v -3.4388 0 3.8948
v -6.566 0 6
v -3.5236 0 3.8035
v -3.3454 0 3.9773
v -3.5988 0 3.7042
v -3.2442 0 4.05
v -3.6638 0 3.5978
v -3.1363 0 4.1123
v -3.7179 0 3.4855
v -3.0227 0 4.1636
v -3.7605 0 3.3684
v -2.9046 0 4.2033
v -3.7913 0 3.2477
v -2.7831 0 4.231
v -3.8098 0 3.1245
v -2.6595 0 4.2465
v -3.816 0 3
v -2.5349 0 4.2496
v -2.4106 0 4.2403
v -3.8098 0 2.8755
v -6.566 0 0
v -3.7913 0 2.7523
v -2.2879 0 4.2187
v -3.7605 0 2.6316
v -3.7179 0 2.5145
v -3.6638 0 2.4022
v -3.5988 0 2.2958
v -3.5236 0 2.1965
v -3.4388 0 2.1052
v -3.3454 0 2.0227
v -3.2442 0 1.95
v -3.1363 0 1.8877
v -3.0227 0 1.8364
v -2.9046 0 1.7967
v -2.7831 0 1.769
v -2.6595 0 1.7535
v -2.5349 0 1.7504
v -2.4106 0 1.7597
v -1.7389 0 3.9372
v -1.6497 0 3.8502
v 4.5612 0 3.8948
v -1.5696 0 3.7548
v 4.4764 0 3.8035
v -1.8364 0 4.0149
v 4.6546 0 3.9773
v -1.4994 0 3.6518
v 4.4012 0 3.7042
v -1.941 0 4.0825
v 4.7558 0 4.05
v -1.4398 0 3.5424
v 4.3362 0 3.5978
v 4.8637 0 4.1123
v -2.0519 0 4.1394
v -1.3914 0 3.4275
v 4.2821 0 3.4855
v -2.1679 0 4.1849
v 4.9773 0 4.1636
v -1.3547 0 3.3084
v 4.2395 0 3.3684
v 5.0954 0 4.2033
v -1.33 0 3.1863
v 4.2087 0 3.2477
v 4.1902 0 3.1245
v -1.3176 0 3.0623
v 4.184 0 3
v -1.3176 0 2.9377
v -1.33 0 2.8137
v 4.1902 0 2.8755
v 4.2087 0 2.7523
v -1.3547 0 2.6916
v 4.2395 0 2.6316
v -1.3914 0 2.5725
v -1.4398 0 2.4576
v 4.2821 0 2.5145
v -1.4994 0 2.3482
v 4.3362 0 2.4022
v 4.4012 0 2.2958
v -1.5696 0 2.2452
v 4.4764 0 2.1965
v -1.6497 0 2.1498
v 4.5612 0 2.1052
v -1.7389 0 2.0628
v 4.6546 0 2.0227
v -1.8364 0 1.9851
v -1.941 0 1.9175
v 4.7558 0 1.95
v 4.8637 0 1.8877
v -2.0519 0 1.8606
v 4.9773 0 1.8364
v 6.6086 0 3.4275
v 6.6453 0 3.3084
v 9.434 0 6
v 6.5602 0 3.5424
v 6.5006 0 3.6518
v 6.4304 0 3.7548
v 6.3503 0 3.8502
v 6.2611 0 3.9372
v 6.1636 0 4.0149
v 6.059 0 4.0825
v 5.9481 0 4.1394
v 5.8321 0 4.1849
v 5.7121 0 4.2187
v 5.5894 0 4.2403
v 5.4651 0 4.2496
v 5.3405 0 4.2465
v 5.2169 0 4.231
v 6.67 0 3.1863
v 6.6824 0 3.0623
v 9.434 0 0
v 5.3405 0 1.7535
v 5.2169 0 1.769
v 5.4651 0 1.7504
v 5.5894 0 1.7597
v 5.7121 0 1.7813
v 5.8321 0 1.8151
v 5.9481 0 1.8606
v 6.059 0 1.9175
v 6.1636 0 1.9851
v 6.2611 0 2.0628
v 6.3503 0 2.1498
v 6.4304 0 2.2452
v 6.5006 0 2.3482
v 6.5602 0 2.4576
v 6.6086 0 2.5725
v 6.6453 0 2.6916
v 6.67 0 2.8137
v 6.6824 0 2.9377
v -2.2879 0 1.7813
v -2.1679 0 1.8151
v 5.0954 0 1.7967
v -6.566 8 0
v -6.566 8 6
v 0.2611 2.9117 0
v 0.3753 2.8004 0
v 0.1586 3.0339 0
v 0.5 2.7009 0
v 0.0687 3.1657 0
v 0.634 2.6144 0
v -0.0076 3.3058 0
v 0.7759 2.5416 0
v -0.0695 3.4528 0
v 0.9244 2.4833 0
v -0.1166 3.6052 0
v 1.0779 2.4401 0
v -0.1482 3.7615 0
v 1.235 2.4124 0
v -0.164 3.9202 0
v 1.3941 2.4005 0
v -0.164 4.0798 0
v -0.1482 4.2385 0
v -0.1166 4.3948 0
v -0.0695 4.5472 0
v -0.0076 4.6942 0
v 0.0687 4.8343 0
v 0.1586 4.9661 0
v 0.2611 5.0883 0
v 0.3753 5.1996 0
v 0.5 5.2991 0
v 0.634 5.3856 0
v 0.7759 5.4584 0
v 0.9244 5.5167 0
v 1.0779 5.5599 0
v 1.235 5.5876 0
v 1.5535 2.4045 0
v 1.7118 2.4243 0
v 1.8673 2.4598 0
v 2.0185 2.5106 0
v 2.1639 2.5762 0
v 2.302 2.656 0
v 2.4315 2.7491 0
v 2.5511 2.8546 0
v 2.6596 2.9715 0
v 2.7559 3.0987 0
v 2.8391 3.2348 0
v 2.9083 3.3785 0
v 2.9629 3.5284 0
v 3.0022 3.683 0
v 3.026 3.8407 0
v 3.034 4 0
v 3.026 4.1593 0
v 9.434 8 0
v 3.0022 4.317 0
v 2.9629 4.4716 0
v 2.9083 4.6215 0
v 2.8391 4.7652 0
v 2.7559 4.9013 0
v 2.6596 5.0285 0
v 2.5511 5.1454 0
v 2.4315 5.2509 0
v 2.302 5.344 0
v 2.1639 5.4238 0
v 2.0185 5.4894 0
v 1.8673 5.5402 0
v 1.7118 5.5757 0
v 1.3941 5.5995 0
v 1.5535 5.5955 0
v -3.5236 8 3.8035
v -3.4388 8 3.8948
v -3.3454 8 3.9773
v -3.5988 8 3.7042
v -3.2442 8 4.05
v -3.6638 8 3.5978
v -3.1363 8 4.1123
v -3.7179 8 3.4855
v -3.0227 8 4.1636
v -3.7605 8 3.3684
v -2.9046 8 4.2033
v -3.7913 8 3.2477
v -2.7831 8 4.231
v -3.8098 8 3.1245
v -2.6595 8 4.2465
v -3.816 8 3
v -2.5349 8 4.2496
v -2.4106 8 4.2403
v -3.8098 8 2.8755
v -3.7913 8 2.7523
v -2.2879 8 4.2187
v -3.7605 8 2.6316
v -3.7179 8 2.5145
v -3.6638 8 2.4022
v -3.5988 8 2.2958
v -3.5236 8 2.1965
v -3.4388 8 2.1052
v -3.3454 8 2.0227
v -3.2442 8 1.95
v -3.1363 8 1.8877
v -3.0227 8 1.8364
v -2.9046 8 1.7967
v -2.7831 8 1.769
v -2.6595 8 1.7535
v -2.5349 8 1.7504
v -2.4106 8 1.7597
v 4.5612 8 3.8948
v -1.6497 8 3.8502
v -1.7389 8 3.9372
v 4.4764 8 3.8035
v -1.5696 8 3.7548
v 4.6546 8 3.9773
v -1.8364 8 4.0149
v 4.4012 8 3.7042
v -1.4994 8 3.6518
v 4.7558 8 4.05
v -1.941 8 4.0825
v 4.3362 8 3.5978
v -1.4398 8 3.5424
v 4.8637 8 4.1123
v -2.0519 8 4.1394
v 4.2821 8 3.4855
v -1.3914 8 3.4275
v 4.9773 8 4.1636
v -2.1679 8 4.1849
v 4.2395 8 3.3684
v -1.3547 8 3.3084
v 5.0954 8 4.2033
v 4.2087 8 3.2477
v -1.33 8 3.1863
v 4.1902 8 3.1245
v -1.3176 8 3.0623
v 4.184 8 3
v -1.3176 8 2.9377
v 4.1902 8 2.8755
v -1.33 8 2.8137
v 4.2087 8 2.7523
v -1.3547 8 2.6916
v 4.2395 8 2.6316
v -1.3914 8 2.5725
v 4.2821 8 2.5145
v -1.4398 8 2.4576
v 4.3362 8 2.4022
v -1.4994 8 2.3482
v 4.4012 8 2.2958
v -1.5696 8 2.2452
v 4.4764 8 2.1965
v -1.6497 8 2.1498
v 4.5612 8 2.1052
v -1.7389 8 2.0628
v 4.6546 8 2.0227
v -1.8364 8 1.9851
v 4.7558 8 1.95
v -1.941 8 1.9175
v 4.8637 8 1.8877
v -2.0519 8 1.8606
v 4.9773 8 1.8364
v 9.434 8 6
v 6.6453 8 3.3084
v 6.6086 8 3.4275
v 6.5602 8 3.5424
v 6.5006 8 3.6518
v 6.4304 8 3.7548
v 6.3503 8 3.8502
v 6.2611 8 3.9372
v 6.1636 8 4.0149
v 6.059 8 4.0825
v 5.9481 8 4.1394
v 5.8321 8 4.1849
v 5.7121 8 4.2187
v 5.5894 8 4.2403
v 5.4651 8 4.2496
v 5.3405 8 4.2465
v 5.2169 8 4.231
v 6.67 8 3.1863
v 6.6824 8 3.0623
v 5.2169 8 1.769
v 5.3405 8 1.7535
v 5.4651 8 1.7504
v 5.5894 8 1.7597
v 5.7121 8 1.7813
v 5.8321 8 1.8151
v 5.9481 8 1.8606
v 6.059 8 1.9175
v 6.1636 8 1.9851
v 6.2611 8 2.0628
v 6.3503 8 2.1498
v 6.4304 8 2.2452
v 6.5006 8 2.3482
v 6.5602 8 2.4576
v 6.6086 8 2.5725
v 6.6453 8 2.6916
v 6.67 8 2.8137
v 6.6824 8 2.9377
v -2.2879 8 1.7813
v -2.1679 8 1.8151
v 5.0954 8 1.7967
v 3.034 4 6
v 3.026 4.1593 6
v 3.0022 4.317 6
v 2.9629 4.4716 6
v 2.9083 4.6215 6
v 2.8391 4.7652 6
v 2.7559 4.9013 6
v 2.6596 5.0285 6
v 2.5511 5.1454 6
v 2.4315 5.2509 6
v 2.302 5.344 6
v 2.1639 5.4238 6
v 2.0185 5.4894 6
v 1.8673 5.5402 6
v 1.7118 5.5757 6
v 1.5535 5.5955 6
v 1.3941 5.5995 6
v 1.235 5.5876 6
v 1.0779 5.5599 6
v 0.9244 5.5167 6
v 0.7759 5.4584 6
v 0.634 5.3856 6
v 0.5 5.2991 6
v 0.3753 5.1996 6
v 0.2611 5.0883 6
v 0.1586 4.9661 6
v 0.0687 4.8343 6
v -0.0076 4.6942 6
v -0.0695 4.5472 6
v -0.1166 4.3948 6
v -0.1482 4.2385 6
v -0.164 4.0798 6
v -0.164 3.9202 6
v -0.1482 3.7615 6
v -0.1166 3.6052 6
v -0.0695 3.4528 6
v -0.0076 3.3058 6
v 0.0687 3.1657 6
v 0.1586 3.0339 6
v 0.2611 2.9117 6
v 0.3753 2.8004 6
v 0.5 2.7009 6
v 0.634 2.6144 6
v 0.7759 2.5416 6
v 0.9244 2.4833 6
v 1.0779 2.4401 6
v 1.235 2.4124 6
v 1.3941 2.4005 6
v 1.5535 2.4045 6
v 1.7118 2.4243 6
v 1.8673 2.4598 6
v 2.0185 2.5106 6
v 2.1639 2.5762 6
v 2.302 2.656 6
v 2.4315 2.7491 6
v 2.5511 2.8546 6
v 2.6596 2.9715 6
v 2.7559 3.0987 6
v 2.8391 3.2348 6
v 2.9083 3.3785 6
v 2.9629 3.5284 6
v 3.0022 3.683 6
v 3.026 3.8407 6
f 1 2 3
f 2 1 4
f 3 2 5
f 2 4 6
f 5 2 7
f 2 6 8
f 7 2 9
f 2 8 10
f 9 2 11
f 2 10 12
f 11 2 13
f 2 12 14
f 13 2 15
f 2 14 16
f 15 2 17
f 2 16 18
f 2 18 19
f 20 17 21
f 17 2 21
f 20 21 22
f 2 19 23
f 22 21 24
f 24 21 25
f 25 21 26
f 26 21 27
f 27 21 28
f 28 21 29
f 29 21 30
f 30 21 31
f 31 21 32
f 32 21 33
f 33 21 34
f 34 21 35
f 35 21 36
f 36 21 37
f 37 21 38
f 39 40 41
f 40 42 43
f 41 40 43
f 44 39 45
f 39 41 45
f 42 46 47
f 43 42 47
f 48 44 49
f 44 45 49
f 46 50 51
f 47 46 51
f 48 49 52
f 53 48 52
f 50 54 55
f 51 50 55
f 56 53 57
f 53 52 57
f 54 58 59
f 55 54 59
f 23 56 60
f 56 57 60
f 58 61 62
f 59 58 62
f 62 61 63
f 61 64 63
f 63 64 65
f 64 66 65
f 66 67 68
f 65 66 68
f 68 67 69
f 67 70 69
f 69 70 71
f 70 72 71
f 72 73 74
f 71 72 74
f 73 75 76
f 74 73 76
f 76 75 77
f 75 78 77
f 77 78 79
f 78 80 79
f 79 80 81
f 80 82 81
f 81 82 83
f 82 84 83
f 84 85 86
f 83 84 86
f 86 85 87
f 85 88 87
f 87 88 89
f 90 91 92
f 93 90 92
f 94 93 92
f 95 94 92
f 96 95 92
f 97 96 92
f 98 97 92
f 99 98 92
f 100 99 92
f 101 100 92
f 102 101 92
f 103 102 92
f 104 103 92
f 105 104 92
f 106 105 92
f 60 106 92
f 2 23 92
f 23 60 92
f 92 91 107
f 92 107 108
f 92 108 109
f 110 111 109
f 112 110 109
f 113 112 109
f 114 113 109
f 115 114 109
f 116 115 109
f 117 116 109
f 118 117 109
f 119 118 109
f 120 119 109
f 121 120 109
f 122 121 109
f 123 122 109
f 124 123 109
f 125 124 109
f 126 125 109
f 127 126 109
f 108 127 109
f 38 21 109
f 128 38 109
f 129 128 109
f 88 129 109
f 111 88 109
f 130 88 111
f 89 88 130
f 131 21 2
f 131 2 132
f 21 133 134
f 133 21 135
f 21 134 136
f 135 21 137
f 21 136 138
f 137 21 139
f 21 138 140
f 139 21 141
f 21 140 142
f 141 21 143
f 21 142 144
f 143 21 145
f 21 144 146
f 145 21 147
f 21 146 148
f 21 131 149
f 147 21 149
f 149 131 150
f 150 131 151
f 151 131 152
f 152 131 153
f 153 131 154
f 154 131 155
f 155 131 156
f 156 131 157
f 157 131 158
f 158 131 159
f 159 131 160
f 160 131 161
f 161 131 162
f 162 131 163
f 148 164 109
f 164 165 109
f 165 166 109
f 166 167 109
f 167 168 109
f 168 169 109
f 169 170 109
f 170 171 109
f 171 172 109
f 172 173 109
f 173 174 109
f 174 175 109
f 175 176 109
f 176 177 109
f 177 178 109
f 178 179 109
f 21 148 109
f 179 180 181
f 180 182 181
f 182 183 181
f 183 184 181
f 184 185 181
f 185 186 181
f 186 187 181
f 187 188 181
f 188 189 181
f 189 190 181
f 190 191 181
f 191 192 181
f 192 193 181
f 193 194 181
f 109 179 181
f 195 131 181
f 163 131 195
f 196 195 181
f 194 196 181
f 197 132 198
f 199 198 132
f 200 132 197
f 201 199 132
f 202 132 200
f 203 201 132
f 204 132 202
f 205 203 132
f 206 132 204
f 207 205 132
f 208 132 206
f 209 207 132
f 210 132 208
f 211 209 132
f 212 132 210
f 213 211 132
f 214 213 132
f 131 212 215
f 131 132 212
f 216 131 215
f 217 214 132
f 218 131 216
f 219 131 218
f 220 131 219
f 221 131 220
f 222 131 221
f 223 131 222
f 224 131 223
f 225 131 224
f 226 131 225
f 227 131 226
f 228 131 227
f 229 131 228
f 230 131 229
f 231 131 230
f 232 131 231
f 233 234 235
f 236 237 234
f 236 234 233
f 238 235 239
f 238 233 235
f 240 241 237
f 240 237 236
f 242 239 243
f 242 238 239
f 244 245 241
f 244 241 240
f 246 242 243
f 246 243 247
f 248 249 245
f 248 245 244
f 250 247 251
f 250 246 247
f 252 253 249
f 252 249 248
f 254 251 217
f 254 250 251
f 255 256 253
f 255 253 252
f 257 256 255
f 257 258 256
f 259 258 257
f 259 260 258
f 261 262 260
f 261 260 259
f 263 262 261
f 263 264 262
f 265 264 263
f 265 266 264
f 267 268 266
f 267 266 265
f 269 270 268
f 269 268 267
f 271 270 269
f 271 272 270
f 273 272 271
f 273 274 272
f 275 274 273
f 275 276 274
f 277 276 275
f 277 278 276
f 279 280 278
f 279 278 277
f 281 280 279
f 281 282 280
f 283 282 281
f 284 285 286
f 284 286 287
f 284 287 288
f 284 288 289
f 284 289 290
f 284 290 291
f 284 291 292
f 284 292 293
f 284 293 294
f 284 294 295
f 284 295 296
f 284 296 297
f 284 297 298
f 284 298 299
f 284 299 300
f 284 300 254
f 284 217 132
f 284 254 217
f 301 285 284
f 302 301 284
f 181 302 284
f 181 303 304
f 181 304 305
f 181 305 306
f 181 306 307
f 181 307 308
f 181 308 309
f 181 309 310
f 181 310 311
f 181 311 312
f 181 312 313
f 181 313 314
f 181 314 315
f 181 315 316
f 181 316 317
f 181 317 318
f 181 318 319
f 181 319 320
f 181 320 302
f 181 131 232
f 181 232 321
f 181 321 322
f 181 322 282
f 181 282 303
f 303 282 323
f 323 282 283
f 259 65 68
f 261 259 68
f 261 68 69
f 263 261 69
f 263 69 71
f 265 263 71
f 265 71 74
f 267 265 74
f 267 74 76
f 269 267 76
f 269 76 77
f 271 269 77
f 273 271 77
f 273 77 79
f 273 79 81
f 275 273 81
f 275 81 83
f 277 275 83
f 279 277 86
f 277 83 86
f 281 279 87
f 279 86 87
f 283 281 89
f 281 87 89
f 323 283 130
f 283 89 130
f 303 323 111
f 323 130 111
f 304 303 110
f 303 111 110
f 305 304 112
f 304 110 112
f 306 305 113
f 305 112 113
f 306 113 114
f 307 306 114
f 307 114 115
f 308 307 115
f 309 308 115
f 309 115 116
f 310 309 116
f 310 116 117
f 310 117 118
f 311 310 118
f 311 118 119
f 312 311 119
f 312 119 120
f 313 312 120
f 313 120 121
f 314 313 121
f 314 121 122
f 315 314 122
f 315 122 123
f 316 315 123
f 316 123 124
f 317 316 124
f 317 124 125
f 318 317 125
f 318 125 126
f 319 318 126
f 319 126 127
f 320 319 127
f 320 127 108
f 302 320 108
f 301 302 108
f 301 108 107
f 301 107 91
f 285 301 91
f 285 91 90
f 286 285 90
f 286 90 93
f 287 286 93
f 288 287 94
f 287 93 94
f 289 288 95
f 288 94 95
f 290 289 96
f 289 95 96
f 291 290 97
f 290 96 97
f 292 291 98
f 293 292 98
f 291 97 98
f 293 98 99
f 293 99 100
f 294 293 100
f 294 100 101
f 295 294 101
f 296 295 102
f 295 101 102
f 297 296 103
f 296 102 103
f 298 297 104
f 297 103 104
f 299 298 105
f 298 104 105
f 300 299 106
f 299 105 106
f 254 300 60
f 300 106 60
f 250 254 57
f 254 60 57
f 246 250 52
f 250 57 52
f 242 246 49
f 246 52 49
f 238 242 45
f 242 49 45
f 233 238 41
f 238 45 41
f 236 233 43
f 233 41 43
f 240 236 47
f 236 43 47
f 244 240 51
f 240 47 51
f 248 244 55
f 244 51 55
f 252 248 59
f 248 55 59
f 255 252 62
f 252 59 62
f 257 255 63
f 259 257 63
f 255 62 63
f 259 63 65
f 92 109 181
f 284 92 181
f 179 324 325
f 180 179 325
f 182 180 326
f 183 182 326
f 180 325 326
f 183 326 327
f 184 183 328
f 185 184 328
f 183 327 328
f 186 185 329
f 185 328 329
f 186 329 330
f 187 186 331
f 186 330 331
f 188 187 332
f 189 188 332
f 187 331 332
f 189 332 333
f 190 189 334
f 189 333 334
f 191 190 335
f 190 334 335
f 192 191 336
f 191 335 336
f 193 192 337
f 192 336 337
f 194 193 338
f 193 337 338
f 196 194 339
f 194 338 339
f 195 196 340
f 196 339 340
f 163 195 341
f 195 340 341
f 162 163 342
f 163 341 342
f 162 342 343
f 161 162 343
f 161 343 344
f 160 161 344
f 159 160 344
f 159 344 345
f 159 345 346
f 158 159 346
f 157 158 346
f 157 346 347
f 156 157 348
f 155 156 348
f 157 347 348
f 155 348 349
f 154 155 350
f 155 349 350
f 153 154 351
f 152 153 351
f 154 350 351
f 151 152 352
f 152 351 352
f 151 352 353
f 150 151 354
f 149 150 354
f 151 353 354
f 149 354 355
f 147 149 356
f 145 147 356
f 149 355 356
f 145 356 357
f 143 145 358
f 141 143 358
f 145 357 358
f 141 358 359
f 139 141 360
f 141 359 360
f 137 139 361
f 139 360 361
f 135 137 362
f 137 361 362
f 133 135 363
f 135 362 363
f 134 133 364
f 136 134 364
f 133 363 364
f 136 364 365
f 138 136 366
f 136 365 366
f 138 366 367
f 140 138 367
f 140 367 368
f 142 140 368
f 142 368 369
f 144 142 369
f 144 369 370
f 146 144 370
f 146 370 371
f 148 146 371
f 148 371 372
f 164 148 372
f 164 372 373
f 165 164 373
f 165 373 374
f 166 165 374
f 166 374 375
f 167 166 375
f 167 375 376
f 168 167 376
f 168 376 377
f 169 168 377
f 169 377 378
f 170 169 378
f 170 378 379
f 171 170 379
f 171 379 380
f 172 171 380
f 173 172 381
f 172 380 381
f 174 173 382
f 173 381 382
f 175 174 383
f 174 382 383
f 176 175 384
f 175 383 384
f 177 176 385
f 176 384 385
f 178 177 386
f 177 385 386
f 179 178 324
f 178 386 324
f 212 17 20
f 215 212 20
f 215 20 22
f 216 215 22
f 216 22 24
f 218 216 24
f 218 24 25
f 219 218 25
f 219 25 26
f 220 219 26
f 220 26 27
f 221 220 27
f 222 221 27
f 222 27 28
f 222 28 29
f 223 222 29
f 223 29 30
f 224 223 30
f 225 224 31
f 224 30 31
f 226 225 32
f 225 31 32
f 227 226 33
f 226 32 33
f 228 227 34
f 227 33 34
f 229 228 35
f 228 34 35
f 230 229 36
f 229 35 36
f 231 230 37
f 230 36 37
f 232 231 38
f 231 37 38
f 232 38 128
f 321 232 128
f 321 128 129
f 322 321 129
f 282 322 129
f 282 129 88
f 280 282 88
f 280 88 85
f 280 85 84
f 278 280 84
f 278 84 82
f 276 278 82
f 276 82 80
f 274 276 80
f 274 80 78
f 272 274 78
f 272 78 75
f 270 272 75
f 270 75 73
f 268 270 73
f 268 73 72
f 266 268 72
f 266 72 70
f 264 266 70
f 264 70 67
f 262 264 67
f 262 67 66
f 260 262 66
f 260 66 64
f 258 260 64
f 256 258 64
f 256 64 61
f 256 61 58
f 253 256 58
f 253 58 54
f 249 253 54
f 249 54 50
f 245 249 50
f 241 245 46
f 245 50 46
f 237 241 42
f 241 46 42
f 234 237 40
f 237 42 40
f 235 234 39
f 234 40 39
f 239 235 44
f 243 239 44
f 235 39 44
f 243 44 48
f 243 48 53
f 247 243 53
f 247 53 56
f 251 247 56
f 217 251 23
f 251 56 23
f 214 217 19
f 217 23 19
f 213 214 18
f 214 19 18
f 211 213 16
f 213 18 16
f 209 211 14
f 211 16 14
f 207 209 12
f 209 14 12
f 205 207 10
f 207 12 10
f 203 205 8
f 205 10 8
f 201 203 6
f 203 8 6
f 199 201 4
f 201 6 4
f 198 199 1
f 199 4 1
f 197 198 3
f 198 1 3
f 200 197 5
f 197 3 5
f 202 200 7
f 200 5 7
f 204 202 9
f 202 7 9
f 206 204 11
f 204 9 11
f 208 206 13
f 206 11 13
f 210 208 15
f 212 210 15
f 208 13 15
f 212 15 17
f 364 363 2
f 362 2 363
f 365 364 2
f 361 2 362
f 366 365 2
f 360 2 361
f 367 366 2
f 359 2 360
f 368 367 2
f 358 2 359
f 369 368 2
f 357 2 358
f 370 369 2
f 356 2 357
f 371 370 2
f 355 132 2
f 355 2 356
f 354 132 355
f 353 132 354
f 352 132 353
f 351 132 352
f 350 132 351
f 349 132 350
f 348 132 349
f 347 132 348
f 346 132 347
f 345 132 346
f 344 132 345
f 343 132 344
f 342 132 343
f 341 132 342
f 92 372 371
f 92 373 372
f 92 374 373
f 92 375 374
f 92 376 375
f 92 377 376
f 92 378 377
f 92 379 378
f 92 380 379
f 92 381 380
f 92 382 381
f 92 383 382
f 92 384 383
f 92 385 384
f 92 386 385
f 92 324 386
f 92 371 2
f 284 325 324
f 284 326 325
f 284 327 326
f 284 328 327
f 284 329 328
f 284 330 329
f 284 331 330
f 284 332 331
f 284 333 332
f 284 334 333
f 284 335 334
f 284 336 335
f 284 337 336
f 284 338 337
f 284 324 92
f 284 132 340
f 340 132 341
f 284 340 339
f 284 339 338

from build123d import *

# Parameters (mm, degrees)
ESQUISSE1_W                               = 16
ESQUISSE1_H                               = 8
BOSS_EXTRU_1_DEPTH                        = 6
TROU_POUR_TARAUDAGE_POUR_TROU_TARAUD_M3_D = 2.5
ESQUISSE4_R                               = 1.6
ENL_V_MAT_EXTRU_1_DEPTH                   = 6


with BuildPart() as part:
    # Esquisse1 → Boss.-Extru.1 (new body)
    with BuildSketch(Plane.XY):
        with Locations((1.433962264, 4)):
            Rectangle(ESQUISSE1_W, ESQUISSE1_H)
    extrude(amount=BOSS_EXTRU_1_DEPTH)

    # Trou pour taraudage pour trou taraudé M31 (through all)
    with Locations(Plane(origin=(0, 8, 0), x_dir=(1, 0, 0), z_dir=(0, 1, 0))):
        with Locations((-2.566037736, -3), (5.433962264, -3)):
            Hole(TROU_POUR_TARAUDAGE_POUR_TROU_TARAUD_M3_D / 2)

    # Esquisse4 → Enlèv. mat.-Extru.1 (cut)
    with BuildSketch(Plane.XY.offset(6)):
        with Locations((1.433962264, 4)):
            Circle(ESQUISSE4_R)
    extrude(amount=-ENL_V_MAT_EXTRU_1_DEPTH, mode=Mode.SUBTRACT)


solid = part.part
